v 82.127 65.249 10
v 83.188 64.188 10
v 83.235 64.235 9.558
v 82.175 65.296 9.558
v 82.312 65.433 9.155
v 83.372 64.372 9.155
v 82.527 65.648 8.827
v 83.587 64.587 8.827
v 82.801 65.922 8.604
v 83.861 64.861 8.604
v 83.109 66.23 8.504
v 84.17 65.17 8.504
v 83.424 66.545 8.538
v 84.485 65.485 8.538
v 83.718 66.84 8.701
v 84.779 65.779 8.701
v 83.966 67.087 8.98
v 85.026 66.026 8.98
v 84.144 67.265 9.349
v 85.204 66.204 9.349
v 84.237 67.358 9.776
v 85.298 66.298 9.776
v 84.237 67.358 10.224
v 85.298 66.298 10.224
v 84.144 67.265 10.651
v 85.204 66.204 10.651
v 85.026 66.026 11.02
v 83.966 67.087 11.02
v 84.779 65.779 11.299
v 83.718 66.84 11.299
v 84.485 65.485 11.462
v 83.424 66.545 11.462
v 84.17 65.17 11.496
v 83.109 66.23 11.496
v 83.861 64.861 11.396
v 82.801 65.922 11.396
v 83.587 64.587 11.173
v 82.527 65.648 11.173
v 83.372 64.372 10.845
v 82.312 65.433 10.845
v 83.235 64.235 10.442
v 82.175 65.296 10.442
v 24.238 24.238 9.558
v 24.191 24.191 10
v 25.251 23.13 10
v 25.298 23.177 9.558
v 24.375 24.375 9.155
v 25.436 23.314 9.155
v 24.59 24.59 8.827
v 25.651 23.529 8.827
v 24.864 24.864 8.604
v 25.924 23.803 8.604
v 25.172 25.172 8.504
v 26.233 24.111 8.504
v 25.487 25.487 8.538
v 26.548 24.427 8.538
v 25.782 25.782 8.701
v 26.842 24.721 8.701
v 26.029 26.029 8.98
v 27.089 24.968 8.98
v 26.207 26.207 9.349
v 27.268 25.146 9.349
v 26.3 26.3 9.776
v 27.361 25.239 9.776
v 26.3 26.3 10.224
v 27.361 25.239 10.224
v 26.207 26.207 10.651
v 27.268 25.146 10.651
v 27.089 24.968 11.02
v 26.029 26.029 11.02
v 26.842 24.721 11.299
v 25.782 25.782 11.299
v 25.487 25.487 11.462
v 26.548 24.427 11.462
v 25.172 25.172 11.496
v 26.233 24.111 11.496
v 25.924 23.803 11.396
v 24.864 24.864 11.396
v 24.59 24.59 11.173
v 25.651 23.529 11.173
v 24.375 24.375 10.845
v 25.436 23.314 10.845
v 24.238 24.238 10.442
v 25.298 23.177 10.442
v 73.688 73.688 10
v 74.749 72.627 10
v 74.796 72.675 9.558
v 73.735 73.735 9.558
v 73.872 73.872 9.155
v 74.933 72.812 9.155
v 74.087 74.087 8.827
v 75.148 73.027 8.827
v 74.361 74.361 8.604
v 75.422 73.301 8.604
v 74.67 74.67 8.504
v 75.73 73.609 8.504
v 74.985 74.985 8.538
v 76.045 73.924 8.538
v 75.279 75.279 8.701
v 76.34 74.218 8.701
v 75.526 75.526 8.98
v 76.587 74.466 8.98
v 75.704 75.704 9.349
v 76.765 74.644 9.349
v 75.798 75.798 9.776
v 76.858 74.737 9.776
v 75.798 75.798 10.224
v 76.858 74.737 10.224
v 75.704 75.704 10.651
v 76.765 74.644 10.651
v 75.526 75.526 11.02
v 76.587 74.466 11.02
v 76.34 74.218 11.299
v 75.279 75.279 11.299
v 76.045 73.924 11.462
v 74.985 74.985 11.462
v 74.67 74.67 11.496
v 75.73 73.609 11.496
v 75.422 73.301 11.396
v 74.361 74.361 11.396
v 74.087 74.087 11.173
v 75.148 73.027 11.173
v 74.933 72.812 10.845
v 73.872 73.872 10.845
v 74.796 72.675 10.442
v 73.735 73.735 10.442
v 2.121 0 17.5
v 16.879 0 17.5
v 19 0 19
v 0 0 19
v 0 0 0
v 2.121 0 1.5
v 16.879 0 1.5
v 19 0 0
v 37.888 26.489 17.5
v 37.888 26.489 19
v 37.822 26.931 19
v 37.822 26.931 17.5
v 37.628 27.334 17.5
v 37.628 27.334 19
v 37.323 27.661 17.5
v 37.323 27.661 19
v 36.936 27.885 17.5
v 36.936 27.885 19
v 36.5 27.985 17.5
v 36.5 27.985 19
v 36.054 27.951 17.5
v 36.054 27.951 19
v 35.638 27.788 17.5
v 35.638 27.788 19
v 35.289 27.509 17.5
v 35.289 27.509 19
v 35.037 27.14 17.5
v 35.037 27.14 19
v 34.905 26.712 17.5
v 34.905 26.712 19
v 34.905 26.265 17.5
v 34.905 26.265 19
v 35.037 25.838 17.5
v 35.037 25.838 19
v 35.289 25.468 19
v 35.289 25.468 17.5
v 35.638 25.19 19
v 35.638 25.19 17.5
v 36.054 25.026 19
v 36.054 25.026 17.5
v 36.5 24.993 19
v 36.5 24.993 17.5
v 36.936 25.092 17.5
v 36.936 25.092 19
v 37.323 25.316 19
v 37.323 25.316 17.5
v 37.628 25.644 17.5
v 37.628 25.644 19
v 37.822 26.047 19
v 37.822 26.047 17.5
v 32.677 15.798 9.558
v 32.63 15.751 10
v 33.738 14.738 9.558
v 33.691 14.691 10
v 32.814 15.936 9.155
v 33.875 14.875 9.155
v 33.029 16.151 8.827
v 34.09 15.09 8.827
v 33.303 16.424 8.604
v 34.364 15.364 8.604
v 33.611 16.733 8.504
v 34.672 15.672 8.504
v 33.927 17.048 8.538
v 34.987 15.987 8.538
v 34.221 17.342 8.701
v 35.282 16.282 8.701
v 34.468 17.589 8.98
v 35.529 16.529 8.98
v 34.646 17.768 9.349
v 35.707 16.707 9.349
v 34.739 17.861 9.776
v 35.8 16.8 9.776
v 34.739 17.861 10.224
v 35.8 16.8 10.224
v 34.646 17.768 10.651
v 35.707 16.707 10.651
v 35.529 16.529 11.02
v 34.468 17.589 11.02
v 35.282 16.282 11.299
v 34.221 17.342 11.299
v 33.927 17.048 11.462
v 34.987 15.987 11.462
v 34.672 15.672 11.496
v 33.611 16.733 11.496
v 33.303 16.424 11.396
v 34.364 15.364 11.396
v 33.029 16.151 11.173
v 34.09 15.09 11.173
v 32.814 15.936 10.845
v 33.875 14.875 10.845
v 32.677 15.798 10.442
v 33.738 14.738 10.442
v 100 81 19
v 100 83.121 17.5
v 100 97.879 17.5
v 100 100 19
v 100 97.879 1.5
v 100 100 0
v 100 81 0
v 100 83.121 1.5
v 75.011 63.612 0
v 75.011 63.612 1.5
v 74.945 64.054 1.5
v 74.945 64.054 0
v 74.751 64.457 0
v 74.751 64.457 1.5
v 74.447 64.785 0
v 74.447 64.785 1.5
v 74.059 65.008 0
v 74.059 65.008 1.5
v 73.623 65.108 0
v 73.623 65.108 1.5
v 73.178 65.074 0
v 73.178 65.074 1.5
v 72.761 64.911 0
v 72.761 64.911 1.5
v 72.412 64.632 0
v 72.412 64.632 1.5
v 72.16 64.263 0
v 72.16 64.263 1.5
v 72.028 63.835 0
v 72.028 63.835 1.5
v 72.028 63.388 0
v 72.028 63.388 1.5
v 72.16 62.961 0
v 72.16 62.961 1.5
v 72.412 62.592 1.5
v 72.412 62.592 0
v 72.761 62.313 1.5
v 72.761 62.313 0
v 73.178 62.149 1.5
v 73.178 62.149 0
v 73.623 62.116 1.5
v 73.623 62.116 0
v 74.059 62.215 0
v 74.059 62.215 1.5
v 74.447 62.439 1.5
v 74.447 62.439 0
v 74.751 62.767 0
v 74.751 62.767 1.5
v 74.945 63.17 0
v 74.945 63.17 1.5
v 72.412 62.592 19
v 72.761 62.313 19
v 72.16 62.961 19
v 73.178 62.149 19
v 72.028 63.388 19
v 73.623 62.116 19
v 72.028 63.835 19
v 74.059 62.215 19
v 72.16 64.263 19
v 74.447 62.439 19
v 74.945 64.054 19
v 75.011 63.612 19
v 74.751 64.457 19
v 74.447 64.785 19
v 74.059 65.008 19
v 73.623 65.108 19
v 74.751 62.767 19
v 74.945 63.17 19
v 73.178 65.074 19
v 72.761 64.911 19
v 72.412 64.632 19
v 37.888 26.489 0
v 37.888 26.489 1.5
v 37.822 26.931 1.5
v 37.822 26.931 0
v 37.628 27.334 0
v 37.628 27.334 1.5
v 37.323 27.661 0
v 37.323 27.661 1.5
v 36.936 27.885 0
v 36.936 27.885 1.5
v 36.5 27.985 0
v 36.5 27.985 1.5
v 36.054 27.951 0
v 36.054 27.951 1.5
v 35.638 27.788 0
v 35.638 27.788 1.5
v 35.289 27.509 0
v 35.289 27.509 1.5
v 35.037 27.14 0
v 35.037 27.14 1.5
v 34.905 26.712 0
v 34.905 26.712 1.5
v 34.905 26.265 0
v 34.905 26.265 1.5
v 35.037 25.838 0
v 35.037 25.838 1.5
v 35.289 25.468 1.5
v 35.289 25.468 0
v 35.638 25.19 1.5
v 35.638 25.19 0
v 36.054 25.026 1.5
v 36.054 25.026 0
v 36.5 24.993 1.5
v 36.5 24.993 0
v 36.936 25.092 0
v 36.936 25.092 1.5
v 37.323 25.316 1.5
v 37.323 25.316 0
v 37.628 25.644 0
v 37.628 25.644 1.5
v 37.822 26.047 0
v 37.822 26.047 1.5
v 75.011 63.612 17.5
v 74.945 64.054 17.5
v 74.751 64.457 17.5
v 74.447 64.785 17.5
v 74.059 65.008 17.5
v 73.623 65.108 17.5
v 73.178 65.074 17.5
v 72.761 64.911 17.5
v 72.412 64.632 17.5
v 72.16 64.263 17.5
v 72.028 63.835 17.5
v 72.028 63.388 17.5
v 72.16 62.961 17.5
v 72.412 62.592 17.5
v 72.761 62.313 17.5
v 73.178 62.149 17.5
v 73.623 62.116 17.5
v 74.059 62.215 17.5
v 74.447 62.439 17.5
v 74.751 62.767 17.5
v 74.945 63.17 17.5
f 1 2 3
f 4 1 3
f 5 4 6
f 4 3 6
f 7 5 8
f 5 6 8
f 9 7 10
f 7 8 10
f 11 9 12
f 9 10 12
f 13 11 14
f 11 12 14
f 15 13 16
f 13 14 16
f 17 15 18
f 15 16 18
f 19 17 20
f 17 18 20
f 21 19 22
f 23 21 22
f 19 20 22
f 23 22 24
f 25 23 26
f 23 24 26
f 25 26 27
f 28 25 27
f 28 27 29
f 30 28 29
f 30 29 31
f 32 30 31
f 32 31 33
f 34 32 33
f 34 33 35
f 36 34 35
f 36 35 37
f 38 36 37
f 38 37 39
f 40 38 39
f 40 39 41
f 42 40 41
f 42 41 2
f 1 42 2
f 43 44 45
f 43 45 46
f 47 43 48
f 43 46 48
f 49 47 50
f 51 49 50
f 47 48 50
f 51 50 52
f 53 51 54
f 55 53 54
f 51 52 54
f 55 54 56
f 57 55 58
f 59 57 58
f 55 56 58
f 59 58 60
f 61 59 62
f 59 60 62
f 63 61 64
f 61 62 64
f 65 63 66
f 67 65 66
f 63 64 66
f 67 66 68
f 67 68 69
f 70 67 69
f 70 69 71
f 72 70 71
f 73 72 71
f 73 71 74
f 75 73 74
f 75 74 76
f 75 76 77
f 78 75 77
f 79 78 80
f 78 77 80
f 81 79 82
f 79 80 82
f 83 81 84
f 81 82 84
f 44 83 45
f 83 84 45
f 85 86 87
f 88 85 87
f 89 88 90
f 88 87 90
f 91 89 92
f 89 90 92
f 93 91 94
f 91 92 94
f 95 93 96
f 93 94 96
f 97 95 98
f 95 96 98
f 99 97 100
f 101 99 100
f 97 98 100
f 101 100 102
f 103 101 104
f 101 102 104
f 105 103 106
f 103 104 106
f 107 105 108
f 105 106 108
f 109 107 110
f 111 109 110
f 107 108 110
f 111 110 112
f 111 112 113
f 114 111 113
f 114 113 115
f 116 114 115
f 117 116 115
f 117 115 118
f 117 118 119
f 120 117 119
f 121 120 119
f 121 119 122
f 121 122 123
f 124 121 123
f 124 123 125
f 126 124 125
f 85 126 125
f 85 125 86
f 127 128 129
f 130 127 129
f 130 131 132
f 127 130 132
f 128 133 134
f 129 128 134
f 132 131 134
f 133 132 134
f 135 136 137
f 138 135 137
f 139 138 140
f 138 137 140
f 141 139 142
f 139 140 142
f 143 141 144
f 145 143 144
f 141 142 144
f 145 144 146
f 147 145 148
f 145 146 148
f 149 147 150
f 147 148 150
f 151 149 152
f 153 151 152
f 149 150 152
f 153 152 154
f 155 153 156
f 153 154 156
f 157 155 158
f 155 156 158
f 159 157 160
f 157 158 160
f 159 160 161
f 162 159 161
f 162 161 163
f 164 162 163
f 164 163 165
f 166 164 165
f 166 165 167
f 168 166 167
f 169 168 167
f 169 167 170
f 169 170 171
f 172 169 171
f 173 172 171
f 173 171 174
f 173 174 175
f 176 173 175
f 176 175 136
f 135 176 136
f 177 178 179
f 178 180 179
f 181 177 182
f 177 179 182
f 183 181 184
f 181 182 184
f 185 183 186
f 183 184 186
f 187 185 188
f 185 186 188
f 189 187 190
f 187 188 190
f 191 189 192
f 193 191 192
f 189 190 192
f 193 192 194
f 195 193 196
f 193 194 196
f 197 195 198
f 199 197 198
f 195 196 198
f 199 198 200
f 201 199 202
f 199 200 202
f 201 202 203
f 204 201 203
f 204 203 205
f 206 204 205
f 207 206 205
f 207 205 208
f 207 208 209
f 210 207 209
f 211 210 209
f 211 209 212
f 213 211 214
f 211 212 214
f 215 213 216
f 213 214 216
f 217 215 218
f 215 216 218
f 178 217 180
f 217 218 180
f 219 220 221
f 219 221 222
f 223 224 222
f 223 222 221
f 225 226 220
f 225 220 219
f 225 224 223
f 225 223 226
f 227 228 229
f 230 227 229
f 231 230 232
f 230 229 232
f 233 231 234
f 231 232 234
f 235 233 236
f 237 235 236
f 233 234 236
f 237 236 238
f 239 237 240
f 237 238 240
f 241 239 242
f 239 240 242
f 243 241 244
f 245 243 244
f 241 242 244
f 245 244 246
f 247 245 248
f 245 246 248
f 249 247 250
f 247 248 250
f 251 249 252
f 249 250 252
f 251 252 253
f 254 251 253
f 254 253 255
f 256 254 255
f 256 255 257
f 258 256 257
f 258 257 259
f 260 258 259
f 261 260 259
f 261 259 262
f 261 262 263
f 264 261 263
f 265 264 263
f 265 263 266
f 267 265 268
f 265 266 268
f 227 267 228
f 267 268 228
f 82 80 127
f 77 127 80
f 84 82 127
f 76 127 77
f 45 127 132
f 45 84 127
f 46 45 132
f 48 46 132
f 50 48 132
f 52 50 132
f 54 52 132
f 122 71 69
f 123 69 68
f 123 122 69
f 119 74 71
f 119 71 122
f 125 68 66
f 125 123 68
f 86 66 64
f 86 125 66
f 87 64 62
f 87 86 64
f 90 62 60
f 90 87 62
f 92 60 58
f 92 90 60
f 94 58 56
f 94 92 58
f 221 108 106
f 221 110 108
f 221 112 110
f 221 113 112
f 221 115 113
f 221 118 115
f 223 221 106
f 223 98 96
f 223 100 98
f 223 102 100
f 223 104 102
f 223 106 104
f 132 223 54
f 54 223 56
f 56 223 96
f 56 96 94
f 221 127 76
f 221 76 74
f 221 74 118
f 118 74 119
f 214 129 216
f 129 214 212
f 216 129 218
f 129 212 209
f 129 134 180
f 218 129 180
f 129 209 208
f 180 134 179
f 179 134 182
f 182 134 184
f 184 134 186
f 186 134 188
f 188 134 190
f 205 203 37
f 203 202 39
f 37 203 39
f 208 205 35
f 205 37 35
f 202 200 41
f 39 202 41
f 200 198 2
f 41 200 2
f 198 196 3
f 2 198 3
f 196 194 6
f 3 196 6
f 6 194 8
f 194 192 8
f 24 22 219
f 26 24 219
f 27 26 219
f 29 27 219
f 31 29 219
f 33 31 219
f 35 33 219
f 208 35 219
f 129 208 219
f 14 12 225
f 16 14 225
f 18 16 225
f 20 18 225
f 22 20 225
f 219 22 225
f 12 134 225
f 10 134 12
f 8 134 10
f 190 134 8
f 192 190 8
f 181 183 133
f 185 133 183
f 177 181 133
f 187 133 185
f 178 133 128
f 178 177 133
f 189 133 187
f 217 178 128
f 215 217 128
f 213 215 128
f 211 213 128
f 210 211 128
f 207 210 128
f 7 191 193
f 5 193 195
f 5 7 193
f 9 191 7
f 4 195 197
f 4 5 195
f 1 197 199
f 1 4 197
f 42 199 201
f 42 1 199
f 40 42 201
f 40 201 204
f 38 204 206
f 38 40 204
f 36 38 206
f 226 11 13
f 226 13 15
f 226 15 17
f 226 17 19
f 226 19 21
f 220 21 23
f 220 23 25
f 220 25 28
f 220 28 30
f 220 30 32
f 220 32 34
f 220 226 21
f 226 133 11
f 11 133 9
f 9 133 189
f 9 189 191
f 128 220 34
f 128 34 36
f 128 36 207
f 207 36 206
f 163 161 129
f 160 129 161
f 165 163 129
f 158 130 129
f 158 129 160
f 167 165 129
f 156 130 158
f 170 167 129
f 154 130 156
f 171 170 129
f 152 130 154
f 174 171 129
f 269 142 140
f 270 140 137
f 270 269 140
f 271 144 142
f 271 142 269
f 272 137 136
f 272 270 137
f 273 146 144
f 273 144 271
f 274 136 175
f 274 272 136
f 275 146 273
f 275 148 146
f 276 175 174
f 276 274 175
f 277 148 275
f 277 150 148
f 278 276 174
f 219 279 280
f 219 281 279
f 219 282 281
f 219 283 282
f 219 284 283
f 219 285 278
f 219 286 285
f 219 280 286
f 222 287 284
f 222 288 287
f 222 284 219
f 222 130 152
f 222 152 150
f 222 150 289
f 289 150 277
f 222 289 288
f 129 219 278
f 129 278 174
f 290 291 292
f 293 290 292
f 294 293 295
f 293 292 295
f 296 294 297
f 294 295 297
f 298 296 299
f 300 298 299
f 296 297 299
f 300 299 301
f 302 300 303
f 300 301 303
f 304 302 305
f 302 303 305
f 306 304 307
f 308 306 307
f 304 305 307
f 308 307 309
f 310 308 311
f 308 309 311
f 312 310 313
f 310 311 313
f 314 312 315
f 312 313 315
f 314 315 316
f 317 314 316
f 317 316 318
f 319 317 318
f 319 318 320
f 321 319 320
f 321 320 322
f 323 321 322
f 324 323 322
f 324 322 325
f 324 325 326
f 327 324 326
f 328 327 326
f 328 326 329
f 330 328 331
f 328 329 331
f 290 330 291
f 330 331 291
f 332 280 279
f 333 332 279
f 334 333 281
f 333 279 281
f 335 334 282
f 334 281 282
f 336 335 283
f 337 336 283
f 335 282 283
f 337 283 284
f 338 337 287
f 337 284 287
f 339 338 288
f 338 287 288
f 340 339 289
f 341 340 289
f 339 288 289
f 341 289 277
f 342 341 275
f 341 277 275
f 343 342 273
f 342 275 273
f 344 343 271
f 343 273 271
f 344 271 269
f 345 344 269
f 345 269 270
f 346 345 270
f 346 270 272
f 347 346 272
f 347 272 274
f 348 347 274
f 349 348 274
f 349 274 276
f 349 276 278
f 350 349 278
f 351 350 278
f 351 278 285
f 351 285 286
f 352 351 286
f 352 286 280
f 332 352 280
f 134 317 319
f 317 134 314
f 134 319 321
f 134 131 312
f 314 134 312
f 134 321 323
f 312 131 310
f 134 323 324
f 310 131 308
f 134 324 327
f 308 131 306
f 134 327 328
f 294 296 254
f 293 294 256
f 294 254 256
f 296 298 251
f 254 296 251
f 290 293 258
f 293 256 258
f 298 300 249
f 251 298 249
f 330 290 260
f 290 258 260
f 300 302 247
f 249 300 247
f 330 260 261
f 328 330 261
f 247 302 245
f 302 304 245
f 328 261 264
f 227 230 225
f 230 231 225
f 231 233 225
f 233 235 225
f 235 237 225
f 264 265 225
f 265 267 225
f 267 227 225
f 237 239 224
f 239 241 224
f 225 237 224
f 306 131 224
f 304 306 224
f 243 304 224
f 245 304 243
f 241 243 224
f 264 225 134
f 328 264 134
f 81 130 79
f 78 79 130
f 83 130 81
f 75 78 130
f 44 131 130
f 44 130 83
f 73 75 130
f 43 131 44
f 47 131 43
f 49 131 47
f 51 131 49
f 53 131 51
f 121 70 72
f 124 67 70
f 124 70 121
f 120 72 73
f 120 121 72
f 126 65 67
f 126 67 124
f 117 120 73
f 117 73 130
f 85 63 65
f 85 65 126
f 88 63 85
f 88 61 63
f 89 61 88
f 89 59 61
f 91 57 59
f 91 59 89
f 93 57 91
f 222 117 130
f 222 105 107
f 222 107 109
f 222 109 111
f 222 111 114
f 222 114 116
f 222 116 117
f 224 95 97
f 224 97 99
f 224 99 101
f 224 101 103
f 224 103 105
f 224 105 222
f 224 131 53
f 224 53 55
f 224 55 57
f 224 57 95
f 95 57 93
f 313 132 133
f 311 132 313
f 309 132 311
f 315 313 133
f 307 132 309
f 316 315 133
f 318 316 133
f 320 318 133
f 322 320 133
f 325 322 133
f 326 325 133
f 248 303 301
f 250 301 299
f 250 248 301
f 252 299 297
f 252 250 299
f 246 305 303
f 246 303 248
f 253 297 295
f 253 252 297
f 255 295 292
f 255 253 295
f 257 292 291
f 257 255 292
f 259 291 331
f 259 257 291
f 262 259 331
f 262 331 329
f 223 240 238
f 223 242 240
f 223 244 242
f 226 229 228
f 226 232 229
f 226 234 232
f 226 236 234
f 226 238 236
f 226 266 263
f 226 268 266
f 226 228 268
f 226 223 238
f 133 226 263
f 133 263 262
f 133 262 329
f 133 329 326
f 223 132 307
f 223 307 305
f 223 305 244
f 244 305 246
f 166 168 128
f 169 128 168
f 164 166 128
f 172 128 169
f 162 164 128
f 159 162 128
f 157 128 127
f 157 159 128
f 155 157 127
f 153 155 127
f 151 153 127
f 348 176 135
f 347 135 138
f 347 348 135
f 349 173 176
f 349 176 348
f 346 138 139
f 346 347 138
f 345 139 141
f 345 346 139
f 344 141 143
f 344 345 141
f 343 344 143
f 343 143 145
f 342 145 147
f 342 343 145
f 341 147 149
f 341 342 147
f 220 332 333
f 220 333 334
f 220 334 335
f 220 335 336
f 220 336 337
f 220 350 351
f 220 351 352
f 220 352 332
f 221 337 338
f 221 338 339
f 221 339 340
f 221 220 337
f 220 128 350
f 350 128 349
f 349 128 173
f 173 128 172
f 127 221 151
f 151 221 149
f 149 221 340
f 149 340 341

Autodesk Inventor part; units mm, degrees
ref_plane "YZ Plane" through (0, 0, 0) normal (1, 0, 0) x (0, 1, 0)
ref_plane "XZ Plane" through (0, 0, 0) normal (0, 1, 0) x (-1, 0, 0)
sketch "Sketch1" plane through (0, 0, 0) normal (0, 0, 1) x (1, 0, 0)
  line L0 (0, 0) -> (100, 0) construction
  line L1 (100, 0) -> (100, 100) construction
  line L2 (100, 100) -> (0, 100) construction
  line L3 (0, 100) -> (0, 0) construction
  line L4 (0, 0) -> (100, 100)
  line L5 (0, 0) -> (19, 0)
  line L6 (100, 100) -> (100, 81)
  line L7 (19, 0) -> (100, 81)
  dimension "d1" = 100
  dimension "d2" = 100
  dimension "d3" = 19
  dimension "d4" = 19
extrude "Extrusion1" add sketch "Sketch1" along normal blind 19
ref_plane "Work Plane1" through (59.5, 40.5, 19) normal (-0.7071, -0.7071, 0) x (-0.7071, 0.7071, 0)
sketch "Sketch2" plane through (59.5, 40.5, 19) normal (-0.7071, -0.7071, 0) x (-0.7071, 0.7071, 0)
  line L0 (13.435, 19) -> (0, 19) projected
  line L1 (13.435, 19) -> (13.435, 0) projected
  line L2 (0, 0) -> (13.435, 0) projected
  line L3 (0, 19) -> (0, 0) projected
  line L4 (11.935, 1.5) -> (11.935, 17.5)
  line L5 (11.935, 17.5) -> (1.5, 17.5)
  line L6 (1.5, 17.5) -> (1.5, 1.5)
  line L7 (1.5, 1.5) -> (11.935, 1.5)
  point P0 (13.435, 19)
  dimension "d7" = 1.5
extrude "Extrusion2" cut sketch "Sketch2" along normal through all both and the other way through all contours L7 L6 L5 L4
sketch "Sketch4" plane through (0, 0, 19) normal (0, 0, 1) x (1, 0, 0)
  line L0 (36.3882, 26.4887) -> (73.5113, 63.6118) construction
  line L1 (54.9497, 45.0503) -> (50, 50) construction
  line L2 (100, 100) -> (0, 0) construction
  circle A0 centre (36.3882, 26.4887) radius 1.5
  circle A1 centre (73.5113, 63.6118) radius 1.5
  line L3 (19, 0) -> (100, 81) projected
  dimension "d22" = 52.5
  dimension "d24" = 7
  dimension "d25" = 3
  dimension "d26" = 3
extrude "Extrusion4" cut sketch "Sketch4" against normal through all
sketch "Sketch5" plane through (100, 81, 19) normal (0.7071, -0.7071, 0) x (-0.7071, -0.7071, 0)
  line L0 (92.2756, 9) -> (22.2756, 9) construction
  line L1 (0, 19) -> (114.5513, 19) projected
  circle A0 centre (92.2756, 9) radius 1.5
  circle A1 centre (22.2756, 9) radius 1.5
  point P0 (127.9863, 19)
  point P1 (57.2756, 19)
  point P2 (57.2756, 9)
  dimension "d29" = 70
  dimension "d30" = 10
  dimension "d31" = 3
  dimension "d32" = 3
extrude "Extrusion5" cut sketch "Sketch5" against normal through all
properties part number "C002" material "Aluminum 6061"
